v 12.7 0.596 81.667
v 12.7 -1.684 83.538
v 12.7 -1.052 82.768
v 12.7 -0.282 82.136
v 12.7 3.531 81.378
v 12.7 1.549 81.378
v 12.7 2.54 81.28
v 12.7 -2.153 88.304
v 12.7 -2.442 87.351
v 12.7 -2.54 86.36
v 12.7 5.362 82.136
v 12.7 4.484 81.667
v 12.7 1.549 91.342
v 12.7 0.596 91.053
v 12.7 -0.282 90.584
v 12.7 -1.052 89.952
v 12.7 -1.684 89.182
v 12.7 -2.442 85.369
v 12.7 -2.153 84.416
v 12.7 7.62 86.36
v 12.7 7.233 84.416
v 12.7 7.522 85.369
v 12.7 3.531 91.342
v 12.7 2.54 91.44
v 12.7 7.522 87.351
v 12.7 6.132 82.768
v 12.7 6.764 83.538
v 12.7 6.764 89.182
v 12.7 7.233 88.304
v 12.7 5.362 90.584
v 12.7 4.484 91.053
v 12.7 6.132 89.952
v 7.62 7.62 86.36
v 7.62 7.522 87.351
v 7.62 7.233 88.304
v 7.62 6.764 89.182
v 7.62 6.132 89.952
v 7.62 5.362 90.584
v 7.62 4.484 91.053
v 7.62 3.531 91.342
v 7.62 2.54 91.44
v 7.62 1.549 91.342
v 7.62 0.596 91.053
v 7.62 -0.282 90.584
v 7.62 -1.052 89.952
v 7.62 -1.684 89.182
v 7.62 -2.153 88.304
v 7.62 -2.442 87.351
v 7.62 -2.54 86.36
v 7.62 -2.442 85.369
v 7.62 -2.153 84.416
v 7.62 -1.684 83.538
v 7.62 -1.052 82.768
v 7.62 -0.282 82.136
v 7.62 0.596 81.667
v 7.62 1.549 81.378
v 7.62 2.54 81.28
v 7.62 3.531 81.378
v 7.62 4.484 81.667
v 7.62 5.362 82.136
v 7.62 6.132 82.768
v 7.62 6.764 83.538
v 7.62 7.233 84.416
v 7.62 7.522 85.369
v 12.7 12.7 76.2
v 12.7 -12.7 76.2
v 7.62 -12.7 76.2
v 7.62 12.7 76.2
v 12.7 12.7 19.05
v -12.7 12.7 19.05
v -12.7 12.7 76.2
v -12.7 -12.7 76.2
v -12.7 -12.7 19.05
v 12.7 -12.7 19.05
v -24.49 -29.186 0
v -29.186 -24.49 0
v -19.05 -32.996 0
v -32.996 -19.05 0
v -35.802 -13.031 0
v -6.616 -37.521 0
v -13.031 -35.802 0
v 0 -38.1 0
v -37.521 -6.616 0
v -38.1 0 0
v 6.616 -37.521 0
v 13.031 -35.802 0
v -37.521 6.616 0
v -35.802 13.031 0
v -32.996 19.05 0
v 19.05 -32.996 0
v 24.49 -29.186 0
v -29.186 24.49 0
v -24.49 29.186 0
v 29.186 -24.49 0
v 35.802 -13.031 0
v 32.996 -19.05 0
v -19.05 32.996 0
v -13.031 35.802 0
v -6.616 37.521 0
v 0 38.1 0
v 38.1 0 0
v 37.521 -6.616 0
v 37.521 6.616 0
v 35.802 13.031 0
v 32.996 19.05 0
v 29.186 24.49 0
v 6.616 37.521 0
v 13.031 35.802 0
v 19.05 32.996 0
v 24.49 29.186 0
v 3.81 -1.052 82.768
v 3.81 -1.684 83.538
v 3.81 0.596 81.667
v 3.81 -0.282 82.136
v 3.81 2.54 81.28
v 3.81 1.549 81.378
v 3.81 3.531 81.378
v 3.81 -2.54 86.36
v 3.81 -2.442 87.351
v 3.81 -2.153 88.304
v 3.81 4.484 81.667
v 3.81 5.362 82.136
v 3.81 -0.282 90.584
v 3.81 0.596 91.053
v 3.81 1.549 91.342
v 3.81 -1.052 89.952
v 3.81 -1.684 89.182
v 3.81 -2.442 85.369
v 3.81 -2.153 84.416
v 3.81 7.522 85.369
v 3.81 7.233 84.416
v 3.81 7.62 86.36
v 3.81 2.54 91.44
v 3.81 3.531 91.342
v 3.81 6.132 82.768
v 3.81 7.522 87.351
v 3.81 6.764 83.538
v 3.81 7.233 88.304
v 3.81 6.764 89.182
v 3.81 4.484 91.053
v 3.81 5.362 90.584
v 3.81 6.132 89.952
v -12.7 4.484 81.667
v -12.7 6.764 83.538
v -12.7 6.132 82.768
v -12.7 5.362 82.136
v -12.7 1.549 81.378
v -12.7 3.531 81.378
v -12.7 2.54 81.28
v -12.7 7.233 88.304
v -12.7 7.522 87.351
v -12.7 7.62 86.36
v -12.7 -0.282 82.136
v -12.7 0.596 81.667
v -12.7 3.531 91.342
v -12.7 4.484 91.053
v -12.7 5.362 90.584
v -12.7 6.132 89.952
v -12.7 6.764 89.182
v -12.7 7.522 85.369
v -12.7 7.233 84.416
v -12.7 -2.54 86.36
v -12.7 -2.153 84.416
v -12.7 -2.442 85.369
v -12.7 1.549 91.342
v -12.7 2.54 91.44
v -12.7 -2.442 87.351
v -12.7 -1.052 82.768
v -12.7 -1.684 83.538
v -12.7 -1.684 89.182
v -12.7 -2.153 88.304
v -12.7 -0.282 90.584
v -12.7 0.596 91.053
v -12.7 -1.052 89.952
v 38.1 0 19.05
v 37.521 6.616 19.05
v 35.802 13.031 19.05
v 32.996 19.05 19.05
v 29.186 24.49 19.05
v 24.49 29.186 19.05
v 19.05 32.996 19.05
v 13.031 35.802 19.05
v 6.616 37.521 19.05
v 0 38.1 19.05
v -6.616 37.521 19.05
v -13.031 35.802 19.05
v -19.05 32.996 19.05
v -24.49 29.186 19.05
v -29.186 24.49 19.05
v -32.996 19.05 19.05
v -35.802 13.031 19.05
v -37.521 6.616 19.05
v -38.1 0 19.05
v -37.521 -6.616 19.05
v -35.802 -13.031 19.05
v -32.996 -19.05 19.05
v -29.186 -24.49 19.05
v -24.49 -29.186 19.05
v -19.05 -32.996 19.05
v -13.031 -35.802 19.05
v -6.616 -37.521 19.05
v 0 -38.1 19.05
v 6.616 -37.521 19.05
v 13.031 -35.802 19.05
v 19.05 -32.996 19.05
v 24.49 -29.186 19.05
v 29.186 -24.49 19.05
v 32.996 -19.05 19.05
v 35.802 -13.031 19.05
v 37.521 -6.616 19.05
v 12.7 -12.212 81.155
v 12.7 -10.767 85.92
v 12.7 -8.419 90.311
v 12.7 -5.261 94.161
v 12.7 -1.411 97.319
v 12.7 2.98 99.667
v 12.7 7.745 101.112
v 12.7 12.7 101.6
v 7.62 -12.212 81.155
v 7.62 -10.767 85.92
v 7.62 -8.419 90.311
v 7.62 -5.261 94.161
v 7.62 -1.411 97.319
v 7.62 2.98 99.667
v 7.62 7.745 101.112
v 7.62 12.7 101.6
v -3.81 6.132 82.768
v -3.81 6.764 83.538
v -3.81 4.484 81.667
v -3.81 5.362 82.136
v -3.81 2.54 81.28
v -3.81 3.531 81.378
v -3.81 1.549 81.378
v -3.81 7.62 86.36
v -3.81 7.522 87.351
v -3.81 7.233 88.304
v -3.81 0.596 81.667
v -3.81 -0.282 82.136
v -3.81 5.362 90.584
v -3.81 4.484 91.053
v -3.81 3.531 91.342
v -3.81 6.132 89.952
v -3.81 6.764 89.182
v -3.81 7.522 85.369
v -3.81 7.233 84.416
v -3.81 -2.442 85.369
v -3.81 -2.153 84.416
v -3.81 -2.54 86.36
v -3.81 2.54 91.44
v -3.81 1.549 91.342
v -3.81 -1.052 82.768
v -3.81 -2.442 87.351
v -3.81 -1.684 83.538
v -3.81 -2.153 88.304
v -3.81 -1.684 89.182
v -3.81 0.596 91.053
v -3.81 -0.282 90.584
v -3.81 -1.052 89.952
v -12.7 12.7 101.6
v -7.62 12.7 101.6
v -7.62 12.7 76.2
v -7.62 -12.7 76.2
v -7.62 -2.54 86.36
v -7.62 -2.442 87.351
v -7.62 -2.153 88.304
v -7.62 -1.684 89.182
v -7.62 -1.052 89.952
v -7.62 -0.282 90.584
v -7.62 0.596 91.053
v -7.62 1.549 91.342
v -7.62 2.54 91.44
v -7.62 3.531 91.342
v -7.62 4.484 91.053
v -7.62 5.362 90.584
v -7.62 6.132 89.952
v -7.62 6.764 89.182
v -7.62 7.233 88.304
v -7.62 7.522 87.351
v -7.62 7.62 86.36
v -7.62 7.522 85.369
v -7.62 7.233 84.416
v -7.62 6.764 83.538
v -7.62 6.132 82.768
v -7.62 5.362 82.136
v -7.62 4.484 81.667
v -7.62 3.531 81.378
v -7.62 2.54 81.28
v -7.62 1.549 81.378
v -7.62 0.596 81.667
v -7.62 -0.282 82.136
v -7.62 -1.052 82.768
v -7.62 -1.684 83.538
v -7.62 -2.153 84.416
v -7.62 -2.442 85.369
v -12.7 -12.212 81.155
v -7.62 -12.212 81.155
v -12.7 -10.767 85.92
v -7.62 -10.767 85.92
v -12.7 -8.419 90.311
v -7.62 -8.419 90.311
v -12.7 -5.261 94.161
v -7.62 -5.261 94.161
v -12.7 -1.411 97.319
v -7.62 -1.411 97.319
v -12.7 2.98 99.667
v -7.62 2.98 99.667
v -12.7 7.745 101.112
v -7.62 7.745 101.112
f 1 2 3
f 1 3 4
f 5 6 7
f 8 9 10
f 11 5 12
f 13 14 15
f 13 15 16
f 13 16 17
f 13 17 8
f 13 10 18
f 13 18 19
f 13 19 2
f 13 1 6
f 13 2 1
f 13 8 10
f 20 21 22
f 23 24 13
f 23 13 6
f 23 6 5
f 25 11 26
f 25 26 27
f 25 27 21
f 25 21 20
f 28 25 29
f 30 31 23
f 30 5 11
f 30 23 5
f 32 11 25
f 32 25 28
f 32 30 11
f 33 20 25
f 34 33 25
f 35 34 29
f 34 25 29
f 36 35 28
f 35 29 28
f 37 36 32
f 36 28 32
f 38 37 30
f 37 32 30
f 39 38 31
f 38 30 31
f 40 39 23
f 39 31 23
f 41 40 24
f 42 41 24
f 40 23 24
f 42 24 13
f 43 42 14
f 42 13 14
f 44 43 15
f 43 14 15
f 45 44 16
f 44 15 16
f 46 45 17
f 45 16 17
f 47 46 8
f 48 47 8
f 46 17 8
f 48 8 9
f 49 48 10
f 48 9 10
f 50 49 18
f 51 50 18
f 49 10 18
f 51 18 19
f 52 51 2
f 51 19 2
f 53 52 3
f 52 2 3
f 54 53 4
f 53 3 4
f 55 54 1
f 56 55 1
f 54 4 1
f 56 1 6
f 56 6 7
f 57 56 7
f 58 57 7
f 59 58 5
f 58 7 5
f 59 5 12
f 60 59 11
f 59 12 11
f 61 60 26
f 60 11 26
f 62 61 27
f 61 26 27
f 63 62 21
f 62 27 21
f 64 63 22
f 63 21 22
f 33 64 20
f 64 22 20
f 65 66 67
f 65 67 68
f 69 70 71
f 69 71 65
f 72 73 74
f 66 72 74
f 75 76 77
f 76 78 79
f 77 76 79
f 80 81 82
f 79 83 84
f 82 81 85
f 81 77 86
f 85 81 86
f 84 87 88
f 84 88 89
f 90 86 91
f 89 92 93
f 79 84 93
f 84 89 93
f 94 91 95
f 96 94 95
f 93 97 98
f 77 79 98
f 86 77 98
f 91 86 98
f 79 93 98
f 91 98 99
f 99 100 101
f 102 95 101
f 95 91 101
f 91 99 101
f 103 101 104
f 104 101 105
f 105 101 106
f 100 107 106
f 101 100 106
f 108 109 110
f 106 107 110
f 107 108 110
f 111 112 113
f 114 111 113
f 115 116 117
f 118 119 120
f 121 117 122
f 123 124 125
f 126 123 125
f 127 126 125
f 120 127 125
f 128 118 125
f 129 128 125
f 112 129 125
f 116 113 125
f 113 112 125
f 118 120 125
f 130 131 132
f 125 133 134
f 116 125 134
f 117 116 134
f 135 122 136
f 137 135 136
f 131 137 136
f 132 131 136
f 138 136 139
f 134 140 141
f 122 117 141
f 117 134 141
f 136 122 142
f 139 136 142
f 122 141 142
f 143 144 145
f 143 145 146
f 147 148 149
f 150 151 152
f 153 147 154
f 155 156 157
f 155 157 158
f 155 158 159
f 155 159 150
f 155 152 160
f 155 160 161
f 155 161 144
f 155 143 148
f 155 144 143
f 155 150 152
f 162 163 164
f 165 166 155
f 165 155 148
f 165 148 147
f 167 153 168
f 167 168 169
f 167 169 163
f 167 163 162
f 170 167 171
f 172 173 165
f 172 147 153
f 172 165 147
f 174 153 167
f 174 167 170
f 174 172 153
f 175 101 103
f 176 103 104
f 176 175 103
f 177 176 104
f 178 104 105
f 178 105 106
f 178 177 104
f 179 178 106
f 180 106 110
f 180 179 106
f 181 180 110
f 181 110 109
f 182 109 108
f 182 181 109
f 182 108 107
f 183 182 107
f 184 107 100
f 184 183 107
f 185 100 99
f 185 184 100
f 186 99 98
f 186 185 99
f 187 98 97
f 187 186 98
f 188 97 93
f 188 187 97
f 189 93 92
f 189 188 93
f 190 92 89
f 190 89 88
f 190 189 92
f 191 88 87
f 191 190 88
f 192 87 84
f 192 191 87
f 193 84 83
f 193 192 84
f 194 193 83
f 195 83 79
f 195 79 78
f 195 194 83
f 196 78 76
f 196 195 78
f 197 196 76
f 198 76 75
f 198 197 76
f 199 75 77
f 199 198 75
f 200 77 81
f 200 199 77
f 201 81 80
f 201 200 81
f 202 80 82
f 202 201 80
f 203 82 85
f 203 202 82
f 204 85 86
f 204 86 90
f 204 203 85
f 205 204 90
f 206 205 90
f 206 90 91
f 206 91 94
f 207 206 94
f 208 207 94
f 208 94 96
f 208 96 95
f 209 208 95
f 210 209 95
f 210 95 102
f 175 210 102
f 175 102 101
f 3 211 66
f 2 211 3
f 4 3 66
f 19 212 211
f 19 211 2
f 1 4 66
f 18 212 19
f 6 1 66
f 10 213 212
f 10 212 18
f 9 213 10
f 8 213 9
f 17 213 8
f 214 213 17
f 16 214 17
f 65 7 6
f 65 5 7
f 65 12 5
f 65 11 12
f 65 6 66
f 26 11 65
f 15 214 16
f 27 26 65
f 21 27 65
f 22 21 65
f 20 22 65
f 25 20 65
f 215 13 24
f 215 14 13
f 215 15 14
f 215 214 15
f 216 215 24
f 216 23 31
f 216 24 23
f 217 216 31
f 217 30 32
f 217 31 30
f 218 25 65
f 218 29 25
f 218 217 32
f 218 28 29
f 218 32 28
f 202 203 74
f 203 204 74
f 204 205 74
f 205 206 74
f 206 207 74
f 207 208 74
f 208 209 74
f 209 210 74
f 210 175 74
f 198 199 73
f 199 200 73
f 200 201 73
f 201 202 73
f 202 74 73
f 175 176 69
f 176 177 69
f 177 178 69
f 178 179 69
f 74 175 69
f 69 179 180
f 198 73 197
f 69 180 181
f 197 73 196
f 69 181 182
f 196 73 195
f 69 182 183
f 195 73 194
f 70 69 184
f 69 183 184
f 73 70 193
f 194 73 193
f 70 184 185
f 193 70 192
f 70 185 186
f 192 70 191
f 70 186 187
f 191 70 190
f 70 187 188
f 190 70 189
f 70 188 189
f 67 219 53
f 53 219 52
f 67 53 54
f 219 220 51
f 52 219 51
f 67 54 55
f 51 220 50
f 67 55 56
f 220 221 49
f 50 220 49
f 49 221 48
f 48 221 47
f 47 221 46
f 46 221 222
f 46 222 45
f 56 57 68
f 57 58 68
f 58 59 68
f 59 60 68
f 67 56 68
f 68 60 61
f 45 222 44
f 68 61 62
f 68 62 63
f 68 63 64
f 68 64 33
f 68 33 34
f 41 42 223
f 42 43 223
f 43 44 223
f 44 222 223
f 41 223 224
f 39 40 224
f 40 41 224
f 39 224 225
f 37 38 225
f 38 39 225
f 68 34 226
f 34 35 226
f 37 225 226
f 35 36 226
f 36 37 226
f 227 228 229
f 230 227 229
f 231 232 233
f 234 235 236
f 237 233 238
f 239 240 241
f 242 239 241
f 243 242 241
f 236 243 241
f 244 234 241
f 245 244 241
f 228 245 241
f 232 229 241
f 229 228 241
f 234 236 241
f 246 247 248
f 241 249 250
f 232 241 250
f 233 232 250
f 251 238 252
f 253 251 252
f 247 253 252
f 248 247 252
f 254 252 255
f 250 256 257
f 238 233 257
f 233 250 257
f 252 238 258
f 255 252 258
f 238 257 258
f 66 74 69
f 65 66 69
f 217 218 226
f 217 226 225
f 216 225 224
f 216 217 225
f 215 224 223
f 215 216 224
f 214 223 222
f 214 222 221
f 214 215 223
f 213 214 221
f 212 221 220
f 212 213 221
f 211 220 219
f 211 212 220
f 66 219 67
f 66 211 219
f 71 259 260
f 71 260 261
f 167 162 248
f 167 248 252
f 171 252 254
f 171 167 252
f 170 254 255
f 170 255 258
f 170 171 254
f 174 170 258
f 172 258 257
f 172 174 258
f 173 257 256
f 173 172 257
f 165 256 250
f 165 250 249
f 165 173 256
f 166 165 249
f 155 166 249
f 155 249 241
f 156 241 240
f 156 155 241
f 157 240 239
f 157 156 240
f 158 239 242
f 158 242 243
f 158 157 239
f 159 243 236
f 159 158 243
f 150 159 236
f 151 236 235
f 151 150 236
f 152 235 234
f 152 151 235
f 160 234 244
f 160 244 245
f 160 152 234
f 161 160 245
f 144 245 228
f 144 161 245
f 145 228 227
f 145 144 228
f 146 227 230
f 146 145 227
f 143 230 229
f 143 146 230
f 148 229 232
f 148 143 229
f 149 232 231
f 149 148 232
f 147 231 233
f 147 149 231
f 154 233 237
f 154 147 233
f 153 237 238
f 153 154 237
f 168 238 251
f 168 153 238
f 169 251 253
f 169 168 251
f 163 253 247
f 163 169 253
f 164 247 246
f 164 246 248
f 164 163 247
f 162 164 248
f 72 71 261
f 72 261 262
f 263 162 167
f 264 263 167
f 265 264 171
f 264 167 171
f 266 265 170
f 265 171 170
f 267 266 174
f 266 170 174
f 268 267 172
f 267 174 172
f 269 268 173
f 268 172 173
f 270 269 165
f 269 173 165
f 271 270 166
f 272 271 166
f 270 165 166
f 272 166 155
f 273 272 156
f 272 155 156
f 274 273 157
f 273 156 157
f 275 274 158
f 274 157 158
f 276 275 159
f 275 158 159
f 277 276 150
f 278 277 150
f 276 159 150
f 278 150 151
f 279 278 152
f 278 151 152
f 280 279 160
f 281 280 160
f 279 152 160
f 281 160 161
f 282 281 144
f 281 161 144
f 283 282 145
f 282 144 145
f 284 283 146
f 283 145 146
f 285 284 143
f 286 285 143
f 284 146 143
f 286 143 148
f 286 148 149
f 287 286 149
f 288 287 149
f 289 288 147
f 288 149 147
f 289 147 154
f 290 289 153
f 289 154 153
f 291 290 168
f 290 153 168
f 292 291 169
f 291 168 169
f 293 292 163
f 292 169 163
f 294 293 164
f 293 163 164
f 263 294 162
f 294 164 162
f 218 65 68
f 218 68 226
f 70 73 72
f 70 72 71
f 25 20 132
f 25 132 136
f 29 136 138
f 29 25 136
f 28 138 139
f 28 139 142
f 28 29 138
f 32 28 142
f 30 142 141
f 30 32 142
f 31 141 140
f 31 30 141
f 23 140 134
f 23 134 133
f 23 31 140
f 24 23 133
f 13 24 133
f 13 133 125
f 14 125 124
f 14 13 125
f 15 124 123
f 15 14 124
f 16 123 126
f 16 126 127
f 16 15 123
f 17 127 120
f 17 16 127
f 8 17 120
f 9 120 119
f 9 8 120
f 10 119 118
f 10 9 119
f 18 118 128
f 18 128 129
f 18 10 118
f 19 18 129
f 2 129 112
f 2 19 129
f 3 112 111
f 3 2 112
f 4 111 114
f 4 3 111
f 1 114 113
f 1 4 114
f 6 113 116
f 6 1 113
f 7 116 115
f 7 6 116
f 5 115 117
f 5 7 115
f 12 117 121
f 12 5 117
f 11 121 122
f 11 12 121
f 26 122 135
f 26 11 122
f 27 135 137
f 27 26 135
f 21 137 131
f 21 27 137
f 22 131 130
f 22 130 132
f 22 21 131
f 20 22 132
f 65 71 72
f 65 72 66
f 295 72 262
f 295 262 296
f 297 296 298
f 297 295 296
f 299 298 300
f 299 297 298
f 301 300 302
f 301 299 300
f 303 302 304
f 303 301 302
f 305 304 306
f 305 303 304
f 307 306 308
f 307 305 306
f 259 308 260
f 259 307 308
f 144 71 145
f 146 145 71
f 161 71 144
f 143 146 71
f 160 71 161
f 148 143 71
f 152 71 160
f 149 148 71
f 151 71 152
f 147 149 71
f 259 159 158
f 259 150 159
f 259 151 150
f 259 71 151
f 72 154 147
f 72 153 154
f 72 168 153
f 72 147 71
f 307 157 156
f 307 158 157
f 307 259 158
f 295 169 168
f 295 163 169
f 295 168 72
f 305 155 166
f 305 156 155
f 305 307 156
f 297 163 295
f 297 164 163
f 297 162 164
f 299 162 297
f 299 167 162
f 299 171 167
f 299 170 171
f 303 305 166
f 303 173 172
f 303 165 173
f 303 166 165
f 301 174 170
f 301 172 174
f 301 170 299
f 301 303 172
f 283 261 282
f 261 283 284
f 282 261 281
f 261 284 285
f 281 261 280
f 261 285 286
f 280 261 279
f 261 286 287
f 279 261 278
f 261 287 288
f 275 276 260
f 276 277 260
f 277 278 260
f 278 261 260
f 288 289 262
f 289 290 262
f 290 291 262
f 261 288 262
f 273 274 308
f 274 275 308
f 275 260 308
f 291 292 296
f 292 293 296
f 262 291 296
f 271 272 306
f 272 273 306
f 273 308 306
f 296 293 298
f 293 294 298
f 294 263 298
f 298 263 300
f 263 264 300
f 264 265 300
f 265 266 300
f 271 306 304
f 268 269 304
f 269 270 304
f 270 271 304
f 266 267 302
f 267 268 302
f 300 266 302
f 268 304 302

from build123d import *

# Parameters (mm, degrees)
F0_W     = 38.1
F0_H     = 19.05
F2_W     = 25.4
F2_H     = 25.4
F3_DEPTH = 76.2
F5_R     = 5.08
F6_DEPTH = 5.08
F4_R     = 5.08
F7_DEPTH = 5.08
F8_DEPTH = 8.89
F9_DEPTH = 8.89


with BuildPart() as f1:
    # F0 (on Front) → F1 (revolve)
    with BuildSketch(Plane.XZ):
        with Locations((19.05, 9.525)):
            Rectangle(F0_W, F0_H)
    revolve(axis=Axis((0, 0, 9.525), (0, 0, 1)))

    # F2 (on Top) → F3 (join)
    with BuildSketch(Plane.XY):
        Rectangle(F2_W, F2_H)
    extrude(amount=F3_DEPTH)


with BuildPart() as f6:
    # F5 (on face) → F6 (new body)
    with BuildSketch(Plane(origin=(-12.7, 0, 0), x_dir=(0, -1, 0), z_dir=(-1, 0, 0))):
        with BuildLine():
            Line((-12.7, 76.2), (12.7, 76.2))
            ThreePointArc((12.7, 76.2), (5.260512, 94.160512), (-12.7, 101.6))
            Line((-12.7, 101.6), (-12.7, 76.2))
        make_face()
        with Locations((-2.54, 86.36)):
            Circle(F5_R, mode=Mode.SUBTRACT)
    extrude(amount=-F6_DEPTH)


with BuildPart() as f7:
    # F4 (on face) → F7 (new body)
    with BuildSketch(Plane.YZ.offset(12.7)):
        with BuildLine():
            Line((-12.7, 76.2), (12.7, 76.2))
            Line((12.7, 76.2), (12.7, 101.6))
            ThreePointArc((12.7, 101.6), (-5.260512, 94.160512), (-12.7, 76.2))
        make_face()
        with Locations((2.54, 86.36)):
            Circle(F4_R, mode=Mode.SUBTRACT)
    extrude(amount=-F7_DEPTH)


with BuildPart() as f8:
    # F4 (on face) → F8 (new body)
    with BuildSketch(Plane.YZ.offset(12.7)):
        with Locations((2.54, 86.36)):
            Circle(F4_R)
    extrude(amount=-F8_DEPTH)


with BuildPart() as f9:
    # F5 (on face) → F9 (new body)
    with BuildSketch(Plane(origin=(-12.7, 0, 0), x_dir=(0, -1, 0), z_dir=(-1, 0, 0))):
        with Locations((-2.54, 86.36)):
            Circle(F5_R)
    extrude(amount=-F9_DEPTH)


solid = Compound([f1.part, f6.part, f7.part, f8.part, f9.part])
